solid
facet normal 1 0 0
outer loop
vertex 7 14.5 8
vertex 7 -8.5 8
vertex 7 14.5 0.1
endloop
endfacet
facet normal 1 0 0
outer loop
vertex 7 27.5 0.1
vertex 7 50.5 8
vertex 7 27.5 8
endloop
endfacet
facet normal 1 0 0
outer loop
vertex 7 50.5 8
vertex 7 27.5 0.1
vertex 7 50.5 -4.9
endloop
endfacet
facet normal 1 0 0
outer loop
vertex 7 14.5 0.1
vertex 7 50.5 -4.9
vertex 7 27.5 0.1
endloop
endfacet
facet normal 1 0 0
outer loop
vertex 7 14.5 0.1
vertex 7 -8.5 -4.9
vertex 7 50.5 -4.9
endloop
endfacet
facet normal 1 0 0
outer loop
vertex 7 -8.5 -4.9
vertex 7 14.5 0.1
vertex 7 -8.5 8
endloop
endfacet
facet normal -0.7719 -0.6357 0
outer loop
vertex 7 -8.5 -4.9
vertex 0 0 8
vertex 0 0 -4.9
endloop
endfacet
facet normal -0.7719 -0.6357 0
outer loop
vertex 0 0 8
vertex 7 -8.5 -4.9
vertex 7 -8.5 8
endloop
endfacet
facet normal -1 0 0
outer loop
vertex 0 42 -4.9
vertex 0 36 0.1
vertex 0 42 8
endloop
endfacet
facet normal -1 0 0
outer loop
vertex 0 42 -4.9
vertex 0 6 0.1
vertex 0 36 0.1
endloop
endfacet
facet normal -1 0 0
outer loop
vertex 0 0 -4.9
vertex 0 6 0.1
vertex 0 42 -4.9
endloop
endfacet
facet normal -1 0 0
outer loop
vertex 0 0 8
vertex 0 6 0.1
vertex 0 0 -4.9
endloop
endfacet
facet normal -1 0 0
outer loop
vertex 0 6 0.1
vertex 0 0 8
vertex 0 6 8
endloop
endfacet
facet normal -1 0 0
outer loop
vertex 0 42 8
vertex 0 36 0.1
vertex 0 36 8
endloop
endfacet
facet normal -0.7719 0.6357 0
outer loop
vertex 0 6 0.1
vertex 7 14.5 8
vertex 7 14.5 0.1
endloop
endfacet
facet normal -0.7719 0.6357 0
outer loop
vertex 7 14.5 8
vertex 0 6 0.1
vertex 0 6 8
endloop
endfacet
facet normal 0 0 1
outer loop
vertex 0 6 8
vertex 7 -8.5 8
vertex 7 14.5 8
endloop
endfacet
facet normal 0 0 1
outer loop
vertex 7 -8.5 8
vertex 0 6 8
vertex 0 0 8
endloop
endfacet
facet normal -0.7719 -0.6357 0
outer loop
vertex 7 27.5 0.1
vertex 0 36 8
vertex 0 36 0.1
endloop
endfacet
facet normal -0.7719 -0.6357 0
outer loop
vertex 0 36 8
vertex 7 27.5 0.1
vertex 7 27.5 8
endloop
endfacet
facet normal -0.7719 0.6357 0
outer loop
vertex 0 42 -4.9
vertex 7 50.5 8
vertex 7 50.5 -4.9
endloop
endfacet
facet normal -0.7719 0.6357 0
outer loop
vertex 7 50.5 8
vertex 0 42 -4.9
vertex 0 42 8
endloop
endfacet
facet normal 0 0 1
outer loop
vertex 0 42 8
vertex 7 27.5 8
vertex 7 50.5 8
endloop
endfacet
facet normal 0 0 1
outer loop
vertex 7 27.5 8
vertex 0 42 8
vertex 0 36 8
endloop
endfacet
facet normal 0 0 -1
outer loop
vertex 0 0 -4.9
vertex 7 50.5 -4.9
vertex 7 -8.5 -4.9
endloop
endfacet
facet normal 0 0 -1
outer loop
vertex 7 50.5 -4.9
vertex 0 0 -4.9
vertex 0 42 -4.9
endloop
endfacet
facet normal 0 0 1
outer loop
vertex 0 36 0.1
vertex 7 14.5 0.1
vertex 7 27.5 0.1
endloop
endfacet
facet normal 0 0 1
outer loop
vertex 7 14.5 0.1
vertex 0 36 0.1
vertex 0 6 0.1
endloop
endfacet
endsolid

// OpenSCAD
/**
 * This work is licensed under a <a rel="license" href="https://creativecommons.org/licenses/by-sa/4.0/">Creative Commons Attribution 4.0 Unported License</a>.
 */

little_base = 6;
height = 7;
depth = 8;
tall_base = 23;

module parrallelipipedic_trapeze(lb, tb, de, he) {
    a = [ 0, 0 ];
    b = [ 0, lb ];
    c = [ he, lb+((tb-lb) / 2) ];
    d = [ he, -((tb-lb) / 2) ];

    linear_extrude(de) {
        polygon([a, b, c,d ]);
    }
}

parrallelipipedic_trapeze(little_base, tall_base, depth, height);
translate([0,36,0]) {
    parrallelipipedic_trapeze(little_base, tall_base, depth, height);
}
translate([0, 0, -4.9]) {
    parrallelipipedic_trapeze(little_base+36, tall_base+36, 5, height);
}
